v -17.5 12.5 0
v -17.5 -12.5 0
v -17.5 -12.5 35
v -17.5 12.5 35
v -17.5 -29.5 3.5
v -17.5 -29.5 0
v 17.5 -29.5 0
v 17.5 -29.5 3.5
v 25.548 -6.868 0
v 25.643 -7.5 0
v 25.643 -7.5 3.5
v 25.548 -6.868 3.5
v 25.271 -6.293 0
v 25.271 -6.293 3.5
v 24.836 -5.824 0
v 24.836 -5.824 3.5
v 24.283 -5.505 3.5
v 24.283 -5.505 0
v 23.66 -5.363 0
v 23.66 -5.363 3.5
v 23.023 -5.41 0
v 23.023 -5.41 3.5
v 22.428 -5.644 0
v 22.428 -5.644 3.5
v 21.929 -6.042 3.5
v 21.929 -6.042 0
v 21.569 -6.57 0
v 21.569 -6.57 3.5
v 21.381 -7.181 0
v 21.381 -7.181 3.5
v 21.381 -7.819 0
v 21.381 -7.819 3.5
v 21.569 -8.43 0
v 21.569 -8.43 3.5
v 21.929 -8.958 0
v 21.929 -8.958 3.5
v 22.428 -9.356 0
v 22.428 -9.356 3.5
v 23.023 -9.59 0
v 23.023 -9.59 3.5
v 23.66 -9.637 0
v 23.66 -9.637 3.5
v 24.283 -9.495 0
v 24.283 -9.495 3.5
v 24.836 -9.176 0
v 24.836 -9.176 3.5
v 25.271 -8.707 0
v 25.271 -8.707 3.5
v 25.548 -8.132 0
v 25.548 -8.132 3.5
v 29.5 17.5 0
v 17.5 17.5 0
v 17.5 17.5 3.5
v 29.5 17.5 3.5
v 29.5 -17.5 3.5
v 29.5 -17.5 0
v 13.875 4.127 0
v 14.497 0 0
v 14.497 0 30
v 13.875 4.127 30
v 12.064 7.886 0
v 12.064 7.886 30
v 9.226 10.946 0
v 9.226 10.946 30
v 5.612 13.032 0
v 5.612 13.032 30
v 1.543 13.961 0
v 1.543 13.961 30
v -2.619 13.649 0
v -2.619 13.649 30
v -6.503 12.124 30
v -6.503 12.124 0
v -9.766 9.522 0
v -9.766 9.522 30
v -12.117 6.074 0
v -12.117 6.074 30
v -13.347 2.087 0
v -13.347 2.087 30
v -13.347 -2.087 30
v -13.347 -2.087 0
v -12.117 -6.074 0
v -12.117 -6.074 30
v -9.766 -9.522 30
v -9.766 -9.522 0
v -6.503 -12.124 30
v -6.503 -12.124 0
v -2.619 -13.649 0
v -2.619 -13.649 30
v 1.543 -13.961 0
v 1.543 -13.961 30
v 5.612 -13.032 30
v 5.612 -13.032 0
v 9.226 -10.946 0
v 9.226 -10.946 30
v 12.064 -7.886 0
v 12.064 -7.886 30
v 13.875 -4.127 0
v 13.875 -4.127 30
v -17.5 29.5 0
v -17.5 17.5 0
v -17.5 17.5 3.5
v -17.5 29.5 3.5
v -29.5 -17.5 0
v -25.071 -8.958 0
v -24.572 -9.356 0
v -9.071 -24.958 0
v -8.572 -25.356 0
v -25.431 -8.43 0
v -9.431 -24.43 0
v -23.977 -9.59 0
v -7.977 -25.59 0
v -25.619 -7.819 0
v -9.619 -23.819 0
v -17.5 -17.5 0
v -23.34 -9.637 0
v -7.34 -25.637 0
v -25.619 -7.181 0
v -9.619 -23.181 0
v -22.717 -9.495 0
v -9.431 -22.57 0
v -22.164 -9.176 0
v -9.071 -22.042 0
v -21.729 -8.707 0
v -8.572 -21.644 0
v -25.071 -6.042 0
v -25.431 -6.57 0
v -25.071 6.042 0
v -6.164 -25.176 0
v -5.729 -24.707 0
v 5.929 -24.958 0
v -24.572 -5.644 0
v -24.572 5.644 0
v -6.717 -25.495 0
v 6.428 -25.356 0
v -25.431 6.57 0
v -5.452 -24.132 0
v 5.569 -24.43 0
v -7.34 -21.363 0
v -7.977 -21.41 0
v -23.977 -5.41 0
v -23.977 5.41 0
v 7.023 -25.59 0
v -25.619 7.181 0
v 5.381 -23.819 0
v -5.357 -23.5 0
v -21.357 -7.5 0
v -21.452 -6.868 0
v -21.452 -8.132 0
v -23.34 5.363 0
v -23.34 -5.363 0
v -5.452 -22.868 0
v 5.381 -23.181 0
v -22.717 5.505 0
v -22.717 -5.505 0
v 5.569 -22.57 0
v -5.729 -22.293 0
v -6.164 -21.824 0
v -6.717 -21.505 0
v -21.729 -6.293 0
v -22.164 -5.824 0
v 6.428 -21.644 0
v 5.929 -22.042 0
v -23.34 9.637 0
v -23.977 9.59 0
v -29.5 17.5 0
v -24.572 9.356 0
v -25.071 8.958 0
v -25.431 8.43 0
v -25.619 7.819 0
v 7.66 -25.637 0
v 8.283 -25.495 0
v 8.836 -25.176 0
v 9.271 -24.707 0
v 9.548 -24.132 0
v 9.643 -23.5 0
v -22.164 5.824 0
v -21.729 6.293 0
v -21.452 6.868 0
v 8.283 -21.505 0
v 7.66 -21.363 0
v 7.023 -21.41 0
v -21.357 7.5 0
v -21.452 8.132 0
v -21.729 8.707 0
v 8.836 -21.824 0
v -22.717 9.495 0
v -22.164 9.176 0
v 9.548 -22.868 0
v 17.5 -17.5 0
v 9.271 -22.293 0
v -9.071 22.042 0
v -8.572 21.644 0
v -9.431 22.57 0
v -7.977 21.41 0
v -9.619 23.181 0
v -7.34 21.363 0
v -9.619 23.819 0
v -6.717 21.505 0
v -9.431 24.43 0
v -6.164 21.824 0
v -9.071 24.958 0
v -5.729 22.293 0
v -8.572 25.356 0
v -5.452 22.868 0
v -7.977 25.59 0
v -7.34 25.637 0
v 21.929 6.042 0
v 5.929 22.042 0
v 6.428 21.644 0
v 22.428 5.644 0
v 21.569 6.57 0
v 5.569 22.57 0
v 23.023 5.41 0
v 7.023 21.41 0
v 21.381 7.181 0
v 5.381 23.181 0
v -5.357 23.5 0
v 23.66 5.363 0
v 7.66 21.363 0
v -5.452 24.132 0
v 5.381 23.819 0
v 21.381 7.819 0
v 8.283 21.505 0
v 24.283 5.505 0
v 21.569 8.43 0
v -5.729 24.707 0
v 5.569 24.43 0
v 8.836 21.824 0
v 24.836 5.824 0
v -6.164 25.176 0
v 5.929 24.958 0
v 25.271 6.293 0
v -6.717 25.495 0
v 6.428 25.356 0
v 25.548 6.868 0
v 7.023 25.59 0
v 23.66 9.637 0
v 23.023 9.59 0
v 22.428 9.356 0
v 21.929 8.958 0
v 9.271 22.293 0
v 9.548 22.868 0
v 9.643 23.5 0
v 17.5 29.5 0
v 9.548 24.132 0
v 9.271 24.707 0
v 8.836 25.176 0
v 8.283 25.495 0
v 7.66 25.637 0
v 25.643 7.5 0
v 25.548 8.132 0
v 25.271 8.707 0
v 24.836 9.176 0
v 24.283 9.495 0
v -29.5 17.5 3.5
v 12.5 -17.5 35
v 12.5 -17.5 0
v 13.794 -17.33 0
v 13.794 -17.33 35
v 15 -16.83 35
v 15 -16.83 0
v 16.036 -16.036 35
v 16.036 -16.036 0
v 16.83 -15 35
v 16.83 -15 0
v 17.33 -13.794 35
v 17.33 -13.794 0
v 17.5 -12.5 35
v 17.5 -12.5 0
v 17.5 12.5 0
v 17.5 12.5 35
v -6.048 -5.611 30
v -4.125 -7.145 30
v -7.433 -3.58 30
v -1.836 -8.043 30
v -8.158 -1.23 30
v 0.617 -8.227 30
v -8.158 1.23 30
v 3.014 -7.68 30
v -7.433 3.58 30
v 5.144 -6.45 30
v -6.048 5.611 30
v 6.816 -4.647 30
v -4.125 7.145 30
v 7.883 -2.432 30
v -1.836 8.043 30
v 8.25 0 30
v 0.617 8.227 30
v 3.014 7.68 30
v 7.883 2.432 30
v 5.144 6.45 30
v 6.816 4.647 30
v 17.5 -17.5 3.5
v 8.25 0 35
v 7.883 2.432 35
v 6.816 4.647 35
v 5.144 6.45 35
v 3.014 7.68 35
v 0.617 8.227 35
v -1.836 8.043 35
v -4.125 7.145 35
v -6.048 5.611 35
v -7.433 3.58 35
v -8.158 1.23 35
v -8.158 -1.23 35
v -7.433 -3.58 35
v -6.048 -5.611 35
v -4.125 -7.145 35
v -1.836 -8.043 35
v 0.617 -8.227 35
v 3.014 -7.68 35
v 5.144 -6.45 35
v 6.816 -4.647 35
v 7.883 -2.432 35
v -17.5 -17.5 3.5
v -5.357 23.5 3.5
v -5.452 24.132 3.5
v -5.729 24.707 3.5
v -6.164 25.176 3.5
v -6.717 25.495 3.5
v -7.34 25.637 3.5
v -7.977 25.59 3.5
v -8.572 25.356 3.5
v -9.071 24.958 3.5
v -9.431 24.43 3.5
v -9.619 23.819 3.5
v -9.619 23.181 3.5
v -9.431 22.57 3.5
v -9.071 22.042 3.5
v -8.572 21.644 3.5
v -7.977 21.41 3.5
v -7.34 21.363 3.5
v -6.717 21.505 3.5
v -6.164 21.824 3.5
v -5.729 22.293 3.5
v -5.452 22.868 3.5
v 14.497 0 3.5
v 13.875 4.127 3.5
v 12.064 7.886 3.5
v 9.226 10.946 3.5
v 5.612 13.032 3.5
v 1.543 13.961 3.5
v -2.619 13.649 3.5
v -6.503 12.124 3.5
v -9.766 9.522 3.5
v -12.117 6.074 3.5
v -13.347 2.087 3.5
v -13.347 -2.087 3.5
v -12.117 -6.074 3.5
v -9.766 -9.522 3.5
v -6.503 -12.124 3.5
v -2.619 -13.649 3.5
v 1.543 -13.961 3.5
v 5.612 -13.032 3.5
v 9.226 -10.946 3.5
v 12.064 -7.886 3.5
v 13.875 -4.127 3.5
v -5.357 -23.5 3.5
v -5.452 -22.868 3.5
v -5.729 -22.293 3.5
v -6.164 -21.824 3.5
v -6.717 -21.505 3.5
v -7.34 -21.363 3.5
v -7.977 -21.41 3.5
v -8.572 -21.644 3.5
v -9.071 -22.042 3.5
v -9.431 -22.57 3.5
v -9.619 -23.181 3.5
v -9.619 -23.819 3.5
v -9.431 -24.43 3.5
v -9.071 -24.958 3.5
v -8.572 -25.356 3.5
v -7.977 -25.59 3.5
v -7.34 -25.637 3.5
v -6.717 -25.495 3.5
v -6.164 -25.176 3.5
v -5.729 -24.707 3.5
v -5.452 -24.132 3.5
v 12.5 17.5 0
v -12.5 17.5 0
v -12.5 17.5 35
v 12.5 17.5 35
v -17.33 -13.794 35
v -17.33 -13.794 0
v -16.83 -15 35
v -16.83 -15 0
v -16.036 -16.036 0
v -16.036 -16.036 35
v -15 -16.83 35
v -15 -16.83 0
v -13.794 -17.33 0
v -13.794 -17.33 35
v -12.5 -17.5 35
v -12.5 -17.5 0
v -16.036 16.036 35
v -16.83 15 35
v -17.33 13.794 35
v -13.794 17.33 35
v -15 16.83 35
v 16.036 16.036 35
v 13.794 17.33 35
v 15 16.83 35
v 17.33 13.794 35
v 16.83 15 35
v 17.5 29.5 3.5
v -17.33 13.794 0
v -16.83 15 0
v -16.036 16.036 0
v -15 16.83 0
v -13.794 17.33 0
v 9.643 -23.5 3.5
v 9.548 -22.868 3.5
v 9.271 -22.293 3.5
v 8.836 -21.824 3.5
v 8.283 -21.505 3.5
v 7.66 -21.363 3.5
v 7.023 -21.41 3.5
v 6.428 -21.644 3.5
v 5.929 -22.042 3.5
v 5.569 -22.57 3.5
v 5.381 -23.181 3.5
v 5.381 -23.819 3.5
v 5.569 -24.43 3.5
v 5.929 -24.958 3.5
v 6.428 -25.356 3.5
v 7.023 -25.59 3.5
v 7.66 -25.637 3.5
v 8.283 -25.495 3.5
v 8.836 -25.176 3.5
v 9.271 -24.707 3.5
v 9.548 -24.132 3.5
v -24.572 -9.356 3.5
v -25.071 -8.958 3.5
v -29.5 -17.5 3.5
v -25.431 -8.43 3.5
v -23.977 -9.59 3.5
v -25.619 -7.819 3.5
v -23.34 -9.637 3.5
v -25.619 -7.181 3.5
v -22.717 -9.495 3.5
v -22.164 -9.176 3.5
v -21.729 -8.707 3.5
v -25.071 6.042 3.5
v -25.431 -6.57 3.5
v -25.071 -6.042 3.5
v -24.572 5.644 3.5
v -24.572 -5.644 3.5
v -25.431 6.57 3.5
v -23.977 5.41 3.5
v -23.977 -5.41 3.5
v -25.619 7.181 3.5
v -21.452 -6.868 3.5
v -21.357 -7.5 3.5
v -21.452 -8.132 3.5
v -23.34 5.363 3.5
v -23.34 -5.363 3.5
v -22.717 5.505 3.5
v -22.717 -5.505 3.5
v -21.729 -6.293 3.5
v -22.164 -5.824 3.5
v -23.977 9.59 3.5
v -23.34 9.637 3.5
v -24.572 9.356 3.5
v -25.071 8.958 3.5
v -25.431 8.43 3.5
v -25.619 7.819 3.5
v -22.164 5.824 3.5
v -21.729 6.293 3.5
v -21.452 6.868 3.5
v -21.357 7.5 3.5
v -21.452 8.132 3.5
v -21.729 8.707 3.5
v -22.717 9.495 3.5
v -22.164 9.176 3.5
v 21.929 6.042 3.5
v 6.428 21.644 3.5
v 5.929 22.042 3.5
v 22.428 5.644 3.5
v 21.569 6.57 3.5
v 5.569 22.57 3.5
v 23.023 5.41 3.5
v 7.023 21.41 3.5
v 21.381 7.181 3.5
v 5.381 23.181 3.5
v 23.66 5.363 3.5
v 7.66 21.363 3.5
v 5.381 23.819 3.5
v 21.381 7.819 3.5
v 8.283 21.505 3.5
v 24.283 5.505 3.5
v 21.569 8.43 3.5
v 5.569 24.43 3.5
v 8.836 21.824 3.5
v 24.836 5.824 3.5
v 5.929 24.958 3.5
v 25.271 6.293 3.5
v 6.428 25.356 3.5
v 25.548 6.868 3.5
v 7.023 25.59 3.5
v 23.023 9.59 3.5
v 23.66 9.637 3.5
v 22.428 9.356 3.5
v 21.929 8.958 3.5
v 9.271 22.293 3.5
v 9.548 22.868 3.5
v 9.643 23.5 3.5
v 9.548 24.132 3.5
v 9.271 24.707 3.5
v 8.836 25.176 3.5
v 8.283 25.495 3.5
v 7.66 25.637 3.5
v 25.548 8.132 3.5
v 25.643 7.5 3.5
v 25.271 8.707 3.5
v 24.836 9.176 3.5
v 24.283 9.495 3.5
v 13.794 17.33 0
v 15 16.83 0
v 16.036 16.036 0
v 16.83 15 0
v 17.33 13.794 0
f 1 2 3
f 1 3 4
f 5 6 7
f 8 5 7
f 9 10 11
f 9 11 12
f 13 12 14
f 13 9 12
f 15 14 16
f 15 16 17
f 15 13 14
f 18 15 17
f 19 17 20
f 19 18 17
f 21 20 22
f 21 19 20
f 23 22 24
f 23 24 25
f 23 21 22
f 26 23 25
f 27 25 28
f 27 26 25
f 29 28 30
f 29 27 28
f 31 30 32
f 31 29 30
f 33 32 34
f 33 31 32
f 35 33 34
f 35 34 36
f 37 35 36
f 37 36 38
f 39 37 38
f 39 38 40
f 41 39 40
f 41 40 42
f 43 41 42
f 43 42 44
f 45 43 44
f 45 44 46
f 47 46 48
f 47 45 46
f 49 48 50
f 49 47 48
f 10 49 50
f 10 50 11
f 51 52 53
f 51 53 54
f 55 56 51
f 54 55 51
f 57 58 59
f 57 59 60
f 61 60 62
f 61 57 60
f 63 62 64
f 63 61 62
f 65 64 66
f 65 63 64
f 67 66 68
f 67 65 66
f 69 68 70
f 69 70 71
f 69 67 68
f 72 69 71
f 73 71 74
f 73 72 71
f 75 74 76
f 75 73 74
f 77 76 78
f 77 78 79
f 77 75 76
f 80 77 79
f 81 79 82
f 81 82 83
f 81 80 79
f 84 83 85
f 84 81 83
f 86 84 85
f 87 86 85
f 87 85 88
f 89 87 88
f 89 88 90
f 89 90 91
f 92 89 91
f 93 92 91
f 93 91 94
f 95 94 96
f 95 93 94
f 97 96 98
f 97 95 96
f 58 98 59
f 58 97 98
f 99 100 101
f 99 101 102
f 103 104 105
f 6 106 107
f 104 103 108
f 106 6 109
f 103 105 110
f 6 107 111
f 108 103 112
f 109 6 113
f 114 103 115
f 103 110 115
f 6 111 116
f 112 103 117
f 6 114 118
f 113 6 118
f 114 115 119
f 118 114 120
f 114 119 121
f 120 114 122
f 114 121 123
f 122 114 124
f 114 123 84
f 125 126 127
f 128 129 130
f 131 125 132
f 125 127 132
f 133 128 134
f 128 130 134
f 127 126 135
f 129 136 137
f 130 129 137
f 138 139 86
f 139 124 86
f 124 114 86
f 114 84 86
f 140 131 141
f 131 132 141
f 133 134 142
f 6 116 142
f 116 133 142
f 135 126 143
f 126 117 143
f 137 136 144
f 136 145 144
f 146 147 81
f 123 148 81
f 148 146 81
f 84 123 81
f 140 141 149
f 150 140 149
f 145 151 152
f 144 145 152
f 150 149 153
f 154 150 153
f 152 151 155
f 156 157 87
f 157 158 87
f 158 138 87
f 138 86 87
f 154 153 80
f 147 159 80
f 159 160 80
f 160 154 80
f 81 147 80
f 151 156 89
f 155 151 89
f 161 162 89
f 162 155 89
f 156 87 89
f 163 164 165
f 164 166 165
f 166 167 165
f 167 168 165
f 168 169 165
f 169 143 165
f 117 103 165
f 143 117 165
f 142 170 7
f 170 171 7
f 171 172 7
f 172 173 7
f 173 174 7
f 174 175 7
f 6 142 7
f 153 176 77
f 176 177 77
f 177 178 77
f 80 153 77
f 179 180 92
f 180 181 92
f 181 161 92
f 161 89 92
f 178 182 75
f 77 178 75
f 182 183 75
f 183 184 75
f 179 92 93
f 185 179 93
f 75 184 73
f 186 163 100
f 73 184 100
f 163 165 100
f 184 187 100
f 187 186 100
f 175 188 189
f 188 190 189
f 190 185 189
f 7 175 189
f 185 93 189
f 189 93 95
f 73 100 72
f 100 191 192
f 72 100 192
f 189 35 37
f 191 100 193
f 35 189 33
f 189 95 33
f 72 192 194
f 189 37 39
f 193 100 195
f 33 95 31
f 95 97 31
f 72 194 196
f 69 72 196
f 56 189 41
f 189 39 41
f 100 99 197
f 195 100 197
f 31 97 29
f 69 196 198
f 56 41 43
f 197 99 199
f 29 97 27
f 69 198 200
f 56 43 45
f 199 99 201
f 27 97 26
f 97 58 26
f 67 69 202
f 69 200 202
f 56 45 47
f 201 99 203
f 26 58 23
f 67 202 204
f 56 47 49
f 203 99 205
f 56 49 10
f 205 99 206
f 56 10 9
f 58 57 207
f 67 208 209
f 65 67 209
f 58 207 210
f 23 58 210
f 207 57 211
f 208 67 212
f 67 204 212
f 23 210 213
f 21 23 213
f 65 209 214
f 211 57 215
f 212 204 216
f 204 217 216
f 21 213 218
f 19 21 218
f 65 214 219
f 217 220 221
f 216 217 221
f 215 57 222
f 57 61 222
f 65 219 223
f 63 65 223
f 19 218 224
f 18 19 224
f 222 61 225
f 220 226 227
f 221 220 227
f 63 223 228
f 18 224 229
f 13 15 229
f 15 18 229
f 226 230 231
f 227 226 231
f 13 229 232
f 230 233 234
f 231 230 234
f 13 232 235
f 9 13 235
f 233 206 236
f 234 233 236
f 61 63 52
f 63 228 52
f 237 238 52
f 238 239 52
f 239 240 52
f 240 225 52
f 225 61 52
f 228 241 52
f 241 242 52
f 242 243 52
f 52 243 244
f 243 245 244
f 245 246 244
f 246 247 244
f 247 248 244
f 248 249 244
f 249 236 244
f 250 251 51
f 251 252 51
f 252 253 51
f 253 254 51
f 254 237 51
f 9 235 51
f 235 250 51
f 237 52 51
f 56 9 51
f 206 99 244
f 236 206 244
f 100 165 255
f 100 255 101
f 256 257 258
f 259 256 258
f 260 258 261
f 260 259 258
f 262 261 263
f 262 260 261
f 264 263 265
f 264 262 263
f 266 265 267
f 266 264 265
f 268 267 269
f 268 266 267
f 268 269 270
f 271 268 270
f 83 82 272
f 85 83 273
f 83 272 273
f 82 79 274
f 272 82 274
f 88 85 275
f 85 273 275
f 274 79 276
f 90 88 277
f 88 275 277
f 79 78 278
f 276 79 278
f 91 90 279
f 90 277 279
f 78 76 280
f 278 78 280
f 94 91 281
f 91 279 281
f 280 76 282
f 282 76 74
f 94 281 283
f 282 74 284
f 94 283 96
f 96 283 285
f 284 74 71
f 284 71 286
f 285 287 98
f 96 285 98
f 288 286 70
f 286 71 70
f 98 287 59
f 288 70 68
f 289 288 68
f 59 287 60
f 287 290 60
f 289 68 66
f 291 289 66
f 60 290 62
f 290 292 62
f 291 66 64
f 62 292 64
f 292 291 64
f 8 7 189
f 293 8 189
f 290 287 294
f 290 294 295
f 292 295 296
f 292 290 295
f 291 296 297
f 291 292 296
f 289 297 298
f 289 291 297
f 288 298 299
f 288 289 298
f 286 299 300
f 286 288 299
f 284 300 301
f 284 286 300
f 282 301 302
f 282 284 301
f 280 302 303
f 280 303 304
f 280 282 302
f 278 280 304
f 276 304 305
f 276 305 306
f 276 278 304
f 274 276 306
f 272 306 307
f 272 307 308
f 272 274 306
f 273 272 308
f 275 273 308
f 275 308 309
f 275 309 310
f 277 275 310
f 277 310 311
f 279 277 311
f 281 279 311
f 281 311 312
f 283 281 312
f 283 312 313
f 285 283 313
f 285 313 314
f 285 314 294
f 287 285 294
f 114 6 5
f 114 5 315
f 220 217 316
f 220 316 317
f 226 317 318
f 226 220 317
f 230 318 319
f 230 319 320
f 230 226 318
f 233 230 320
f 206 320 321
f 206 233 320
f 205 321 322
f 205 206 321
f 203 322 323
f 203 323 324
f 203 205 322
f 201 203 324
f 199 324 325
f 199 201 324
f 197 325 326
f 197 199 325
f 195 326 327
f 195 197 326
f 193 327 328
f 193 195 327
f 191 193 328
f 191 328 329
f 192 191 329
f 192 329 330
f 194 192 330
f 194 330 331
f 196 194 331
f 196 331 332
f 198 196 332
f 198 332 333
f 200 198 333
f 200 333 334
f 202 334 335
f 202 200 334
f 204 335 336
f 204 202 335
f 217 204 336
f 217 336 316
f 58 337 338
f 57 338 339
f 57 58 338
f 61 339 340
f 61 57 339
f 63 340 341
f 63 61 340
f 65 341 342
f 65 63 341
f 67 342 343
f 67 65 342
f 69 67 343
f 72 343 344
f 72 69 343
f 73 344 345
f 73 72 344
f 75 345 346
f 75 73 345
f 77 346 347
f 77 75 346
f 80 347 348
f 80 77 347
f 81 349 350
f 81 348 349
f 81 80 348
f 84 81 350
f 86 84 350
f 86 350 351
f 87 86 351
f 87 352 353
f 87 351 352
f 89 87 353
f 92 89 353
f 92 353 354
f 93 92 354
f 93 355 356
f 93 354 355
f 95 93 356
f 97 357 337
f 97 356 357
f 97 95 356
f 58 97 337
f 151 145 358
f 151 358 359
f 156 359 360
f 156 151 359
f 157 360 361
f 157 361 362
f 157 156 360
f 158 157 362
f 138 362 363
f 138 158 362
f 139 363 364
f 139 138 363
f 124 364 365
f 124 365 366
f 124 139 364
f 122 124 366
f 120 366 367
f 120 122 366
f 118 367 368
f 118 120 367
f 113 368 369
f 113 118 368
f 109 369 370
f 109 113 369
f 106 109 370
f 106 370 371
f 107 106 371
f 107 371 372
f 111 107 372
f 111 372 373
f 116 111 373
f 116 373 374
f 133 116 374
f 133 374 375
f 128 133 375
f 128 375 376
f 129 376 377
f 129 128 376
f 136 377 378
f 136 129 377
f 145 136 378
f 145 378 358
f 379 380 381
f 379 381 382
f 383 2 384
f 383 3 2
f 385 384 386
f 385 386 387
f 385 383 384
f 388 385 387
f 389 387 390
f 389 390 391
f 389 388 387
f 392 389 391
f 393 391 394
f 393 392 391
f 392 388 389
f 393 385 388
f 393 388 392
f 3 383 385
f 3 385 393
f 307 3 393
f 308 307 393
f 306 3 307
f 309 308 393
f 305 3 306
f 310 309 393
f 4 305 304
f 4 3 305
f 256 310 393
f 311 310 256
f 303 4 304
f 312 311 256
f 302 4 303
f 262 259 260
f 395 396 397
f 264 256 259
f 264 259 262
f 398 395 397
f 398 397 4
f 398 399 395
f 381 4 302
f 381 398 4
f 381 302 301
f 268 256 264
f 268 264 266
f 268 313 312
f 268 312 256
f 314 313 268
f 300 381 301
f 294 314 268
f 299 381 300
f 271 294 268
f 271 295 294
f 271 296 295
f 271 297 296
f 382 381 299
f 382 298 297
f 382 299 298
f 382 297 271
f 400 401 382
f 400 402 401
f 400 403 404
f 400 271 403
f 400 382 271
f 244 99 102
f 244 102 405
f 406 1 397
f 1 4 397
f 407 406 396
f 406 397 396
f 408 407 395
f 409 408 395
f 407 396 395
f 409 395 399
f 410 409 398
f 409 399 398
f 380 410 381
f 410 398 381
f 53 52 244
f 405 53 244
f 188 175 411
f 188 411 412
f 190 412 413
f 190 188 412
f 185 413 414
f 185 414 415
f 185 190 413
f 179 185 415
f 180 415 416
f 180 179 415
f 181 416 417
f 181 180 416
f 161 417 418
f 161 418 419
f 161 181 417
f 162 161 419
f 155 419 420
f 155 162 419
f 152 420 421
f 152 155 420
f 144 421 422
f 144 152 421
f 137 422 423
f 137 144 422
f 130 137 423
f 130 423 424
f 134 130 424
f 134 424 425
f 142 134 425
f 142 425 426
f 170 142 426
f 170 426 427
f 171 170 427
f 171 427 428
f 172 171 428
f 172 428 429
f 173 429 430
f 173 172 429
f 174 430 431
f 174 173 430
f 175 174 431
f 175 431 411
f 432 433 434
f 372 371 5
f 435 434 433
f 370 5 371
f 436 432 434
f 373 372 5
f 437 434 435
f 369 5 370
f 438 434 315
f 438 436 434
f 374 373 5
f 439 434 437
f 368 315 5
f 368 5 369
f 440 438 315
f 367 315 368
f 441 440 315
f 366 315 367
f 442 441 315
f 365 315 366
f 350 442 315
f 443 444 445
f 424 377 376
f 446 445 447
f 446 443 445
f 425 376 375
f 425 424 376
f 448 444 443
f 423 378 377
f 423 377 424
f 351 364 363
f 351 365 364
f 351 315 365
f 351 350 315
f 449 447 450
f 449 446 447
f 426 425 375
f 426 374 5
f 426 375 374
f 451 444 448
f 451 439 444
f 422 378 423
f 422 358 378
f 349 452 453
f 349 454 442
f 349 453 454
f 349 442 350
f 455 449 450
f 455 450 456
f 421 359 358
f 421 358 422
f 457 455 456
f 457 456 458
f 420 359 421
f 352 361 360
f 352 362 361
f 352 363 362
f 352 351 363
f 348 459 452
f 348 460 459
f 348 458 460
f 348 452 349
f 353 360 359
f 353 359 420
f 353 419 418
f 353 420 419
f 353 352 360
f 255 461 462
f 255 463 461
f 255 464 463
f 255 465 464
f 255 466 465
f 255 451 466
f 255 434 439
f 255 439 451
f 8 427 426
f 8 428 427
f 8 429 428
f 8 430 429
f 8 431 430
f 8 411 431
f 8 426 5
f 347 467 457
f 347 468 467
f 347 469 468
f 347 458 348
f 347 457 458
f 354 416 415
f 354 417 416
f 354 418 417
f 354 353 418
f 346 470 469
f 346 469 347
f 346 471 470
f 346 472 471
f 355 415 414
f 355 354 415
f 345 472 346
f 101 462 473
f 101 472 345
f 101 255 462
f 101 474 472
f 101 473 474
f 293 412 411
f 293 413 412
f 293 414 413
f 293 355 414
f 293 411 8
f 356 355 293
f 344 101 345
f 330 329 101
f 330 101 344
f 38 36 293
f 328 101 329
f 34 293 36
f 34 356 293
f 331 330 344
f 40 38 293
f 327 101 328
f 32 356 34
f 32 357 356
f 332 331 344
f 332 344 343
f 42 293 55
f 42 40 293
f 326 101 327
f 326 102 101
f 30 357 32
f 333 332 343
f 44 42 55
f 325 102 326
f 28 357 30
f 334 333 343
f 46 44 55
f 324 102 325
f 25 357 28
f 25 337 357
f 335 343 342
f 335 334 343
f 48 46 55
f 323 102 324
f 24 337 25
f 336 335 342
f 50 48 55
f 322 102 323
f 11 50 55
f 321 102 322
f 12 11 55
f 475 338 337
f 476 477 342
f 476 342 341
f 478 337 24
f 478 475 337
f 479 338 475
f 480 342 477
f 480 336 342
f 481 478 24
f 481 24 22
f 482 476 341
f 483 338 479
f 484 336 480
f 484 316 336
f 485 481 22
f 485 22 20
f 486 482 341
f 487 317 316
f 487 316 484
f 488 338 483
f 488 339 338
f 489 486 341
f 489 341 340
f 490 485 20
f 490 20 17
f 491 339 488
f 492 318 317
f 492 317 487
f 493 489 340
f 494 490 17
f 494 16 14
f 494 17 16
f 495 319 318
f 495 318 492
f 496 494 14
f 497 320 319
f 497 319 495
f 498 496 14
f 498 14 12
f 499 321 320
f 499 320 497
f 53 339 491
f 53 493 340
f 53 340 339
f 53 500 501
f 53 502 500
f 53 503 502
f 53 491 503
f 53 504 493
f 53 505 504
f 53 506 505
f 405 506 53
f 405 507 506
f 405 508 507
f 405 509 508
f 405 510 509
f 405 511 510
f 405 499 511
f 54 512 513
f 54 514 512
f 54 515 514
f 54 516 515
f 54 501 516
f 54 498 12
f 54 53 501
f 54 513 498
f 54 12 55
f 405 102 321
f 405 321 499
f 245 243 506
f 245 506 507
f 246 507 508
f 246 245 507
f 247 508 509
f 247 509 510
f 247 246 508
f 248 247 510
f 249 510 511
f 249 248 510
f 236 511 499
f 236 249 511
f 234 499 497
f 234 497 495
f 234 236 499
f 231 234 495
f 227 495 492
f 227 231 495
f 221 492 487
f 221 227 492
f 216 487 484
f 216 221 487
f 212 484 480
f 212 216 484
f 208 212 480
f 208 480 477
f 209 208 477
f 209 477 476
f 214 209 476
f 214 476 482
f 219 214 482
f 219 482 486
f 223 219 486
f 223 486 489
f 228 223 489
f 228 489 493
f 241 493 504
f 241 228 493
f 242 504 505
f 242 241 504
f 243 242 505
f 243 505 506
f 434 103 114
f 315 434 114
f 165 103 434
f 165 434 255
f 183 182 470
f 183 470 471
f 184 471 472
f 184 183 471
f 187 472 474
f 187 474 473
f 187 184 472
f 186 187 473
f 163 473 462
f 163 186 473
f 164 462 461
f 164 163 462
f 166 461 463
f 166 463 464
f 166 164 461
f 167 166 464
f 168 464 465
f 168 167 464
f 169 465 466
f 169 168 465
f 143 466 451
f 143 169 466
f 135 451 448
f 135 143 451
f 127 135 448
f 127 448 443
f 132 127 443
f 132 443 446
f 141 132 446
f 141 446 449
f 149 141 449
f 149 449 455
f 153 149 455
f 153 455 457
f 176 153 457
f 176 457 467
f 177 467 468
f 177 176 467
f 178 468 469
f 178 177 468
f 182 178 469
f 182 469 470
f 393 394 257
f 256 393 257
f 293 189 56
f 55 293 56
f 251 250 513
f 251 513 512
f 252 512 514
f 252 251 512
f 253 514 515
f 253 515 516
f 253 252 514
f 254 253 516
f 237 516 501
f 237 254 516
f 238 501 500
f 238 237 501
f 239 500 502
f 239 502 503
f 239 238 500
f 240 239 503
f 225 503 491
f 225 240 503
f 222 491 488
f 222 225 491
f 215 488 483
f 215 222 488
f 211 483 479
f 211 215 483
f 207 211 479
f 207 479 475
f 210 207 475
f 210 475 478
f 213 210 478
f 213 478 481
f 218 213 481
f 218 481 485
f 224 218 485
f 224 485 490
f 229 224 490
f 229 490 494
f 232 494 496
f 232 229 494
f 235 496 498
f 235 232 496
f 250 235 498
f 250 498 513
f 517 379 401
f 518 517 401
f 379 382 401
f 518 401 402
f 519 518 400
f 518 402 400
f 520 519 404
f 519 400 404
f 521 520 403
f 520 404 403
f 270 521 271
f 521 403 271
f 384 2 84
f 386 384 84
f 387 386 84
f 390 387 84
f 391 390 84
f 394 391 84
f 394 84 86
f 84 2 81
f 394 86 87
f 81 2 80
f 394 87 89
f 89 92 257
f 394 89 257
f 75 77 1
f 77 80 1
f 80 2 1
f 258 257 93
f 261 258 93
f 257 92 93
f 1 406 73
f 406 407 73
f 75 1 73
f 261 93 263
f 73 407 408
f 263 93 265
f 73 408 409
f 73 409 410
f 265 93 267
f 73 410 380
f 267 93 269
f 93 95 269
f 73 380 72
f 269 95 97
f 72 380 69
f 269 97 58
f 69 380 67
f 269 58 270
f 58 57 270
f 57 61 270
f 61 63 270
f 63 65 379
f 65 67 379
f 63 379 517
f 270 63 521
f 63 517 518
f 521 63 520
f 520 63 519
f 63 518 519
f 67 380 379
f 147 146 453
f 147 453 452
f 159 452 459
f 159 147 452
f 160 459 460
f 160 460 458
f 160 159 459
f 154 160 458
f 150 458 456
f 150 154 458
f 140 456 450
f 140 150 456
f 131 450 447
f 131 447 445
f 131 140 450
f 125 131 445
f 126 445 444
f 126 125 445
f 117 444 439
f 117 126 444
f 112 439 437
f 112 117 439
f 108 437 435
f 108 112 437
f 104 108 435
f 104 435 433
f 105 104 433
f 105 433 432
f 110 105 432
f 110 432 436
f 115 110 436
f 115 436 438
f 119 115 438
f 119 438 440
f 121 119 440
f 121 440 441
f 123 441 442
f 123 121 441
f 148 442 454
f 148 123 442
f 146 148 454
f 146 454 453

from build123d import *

# Parameters (mm, degrees)
F0_W     = 12
F0_H     = 35
F0_R     = 2.14341
F0_W_2   = 35
F0_H_2   = 12
F0_R_2   = 8.25
F1_DEPTH = 3.5
F2_DEPTH = 35
F3_R     = 5
F4_R     = 14
F5_DEPTH = 30


with BuildPart() as f1:
    # F0 (on Top) → F1 (new body)
    with BuildSketch(Plane.XY):
        with Locations((-23.5, 0)):
            Rectangle(F0_W, F0_H)
        with Locations((-23.5, -7.5)):
            Circle(F0_R, mode=Mode.SUBTRACT)
        with Locations((-23.5, 7.5)):
            Circle(F0_R, mode=Mode.SUBTRACT)
        with Locations((0, 23.5)):
            Rectangle(F0_W_2, F0_H_2)
        with Locations((-7.5, 23.5)):
            Circle(F0_R, mode=Mode.SUBTRACT)
        with Locations((7.5, 23.5)):
            Circle(F0_R, mode=Mode.SUBTRACT)
        with Locations((23.5, 0)):
            Rectangle(F0_W, F0_H)
        with Locations((23.5, -7.5)):
            Circle(F0_R, mode=Mode.SUBTRACT)
        with Locations((23.5, 7.5)):
            Circle(F0_R, mode=Mode.SUBTRACT)
        with Locations((0, -23.5)):
            Rectangle(F0_W_2, F0_H_2)
        with Locations((-7.5, -23.5)):
            Circle(F0_R, mode=Mode.SUBTRACT)
        with Locations((7.5, -23.5)):
            Circle(F0_R, mode=Mode.SUBTRACT)
        Rectangle(F0_W_2, F0_H)
        Circle(F0_R_2, mode=Mode.SUBTRACT)
    extrude(amount=F1_DEPTH)


with BuildPart() as f2:
    # F0 (on Top) → F2 (new body)
    with BuildSketch(Plane.XY):
        Rectangle(F0_W_2, F0_H)
        Circle(F0_R_2, mode=Mode.SUBTRACT)
    extrude(amount=F2_DEPTH)

    # F3
    f3_edges = [f2.edges().sort_by_distance(p)[0] for p in [
        (-17.5, -17.5, 17.5),
        (17.5, -17.5, 17.5),
        (17.5, 17.5, 17.5),
        (-17.5, 17.5, 17.5),
    ]]
    fillet(f3_edges, radius=F3_R)


with BuildPart() as f5_tool:
    # F4 (on face) → F5 (new body)
    with BuildSketch(Plane.XY):
        with Locations((0.496793, 0)):
            Circle(F4_R)
    extrude(amount=F5_DEPTH)


with BuildPart() as f1_1:
    add(f1.part)

    # F5: cut by f5_tool
    add(f5_tool.part, mode=Mode.SUBTRACT)


with BuildPart() as f2_1:
    add(f2.part)

    # F5: cut by f5_tool
    add(f5_tool.part, mode=Mode.SUBTRACT)


solid = Compound([f1_1.part, f2_1.part])
